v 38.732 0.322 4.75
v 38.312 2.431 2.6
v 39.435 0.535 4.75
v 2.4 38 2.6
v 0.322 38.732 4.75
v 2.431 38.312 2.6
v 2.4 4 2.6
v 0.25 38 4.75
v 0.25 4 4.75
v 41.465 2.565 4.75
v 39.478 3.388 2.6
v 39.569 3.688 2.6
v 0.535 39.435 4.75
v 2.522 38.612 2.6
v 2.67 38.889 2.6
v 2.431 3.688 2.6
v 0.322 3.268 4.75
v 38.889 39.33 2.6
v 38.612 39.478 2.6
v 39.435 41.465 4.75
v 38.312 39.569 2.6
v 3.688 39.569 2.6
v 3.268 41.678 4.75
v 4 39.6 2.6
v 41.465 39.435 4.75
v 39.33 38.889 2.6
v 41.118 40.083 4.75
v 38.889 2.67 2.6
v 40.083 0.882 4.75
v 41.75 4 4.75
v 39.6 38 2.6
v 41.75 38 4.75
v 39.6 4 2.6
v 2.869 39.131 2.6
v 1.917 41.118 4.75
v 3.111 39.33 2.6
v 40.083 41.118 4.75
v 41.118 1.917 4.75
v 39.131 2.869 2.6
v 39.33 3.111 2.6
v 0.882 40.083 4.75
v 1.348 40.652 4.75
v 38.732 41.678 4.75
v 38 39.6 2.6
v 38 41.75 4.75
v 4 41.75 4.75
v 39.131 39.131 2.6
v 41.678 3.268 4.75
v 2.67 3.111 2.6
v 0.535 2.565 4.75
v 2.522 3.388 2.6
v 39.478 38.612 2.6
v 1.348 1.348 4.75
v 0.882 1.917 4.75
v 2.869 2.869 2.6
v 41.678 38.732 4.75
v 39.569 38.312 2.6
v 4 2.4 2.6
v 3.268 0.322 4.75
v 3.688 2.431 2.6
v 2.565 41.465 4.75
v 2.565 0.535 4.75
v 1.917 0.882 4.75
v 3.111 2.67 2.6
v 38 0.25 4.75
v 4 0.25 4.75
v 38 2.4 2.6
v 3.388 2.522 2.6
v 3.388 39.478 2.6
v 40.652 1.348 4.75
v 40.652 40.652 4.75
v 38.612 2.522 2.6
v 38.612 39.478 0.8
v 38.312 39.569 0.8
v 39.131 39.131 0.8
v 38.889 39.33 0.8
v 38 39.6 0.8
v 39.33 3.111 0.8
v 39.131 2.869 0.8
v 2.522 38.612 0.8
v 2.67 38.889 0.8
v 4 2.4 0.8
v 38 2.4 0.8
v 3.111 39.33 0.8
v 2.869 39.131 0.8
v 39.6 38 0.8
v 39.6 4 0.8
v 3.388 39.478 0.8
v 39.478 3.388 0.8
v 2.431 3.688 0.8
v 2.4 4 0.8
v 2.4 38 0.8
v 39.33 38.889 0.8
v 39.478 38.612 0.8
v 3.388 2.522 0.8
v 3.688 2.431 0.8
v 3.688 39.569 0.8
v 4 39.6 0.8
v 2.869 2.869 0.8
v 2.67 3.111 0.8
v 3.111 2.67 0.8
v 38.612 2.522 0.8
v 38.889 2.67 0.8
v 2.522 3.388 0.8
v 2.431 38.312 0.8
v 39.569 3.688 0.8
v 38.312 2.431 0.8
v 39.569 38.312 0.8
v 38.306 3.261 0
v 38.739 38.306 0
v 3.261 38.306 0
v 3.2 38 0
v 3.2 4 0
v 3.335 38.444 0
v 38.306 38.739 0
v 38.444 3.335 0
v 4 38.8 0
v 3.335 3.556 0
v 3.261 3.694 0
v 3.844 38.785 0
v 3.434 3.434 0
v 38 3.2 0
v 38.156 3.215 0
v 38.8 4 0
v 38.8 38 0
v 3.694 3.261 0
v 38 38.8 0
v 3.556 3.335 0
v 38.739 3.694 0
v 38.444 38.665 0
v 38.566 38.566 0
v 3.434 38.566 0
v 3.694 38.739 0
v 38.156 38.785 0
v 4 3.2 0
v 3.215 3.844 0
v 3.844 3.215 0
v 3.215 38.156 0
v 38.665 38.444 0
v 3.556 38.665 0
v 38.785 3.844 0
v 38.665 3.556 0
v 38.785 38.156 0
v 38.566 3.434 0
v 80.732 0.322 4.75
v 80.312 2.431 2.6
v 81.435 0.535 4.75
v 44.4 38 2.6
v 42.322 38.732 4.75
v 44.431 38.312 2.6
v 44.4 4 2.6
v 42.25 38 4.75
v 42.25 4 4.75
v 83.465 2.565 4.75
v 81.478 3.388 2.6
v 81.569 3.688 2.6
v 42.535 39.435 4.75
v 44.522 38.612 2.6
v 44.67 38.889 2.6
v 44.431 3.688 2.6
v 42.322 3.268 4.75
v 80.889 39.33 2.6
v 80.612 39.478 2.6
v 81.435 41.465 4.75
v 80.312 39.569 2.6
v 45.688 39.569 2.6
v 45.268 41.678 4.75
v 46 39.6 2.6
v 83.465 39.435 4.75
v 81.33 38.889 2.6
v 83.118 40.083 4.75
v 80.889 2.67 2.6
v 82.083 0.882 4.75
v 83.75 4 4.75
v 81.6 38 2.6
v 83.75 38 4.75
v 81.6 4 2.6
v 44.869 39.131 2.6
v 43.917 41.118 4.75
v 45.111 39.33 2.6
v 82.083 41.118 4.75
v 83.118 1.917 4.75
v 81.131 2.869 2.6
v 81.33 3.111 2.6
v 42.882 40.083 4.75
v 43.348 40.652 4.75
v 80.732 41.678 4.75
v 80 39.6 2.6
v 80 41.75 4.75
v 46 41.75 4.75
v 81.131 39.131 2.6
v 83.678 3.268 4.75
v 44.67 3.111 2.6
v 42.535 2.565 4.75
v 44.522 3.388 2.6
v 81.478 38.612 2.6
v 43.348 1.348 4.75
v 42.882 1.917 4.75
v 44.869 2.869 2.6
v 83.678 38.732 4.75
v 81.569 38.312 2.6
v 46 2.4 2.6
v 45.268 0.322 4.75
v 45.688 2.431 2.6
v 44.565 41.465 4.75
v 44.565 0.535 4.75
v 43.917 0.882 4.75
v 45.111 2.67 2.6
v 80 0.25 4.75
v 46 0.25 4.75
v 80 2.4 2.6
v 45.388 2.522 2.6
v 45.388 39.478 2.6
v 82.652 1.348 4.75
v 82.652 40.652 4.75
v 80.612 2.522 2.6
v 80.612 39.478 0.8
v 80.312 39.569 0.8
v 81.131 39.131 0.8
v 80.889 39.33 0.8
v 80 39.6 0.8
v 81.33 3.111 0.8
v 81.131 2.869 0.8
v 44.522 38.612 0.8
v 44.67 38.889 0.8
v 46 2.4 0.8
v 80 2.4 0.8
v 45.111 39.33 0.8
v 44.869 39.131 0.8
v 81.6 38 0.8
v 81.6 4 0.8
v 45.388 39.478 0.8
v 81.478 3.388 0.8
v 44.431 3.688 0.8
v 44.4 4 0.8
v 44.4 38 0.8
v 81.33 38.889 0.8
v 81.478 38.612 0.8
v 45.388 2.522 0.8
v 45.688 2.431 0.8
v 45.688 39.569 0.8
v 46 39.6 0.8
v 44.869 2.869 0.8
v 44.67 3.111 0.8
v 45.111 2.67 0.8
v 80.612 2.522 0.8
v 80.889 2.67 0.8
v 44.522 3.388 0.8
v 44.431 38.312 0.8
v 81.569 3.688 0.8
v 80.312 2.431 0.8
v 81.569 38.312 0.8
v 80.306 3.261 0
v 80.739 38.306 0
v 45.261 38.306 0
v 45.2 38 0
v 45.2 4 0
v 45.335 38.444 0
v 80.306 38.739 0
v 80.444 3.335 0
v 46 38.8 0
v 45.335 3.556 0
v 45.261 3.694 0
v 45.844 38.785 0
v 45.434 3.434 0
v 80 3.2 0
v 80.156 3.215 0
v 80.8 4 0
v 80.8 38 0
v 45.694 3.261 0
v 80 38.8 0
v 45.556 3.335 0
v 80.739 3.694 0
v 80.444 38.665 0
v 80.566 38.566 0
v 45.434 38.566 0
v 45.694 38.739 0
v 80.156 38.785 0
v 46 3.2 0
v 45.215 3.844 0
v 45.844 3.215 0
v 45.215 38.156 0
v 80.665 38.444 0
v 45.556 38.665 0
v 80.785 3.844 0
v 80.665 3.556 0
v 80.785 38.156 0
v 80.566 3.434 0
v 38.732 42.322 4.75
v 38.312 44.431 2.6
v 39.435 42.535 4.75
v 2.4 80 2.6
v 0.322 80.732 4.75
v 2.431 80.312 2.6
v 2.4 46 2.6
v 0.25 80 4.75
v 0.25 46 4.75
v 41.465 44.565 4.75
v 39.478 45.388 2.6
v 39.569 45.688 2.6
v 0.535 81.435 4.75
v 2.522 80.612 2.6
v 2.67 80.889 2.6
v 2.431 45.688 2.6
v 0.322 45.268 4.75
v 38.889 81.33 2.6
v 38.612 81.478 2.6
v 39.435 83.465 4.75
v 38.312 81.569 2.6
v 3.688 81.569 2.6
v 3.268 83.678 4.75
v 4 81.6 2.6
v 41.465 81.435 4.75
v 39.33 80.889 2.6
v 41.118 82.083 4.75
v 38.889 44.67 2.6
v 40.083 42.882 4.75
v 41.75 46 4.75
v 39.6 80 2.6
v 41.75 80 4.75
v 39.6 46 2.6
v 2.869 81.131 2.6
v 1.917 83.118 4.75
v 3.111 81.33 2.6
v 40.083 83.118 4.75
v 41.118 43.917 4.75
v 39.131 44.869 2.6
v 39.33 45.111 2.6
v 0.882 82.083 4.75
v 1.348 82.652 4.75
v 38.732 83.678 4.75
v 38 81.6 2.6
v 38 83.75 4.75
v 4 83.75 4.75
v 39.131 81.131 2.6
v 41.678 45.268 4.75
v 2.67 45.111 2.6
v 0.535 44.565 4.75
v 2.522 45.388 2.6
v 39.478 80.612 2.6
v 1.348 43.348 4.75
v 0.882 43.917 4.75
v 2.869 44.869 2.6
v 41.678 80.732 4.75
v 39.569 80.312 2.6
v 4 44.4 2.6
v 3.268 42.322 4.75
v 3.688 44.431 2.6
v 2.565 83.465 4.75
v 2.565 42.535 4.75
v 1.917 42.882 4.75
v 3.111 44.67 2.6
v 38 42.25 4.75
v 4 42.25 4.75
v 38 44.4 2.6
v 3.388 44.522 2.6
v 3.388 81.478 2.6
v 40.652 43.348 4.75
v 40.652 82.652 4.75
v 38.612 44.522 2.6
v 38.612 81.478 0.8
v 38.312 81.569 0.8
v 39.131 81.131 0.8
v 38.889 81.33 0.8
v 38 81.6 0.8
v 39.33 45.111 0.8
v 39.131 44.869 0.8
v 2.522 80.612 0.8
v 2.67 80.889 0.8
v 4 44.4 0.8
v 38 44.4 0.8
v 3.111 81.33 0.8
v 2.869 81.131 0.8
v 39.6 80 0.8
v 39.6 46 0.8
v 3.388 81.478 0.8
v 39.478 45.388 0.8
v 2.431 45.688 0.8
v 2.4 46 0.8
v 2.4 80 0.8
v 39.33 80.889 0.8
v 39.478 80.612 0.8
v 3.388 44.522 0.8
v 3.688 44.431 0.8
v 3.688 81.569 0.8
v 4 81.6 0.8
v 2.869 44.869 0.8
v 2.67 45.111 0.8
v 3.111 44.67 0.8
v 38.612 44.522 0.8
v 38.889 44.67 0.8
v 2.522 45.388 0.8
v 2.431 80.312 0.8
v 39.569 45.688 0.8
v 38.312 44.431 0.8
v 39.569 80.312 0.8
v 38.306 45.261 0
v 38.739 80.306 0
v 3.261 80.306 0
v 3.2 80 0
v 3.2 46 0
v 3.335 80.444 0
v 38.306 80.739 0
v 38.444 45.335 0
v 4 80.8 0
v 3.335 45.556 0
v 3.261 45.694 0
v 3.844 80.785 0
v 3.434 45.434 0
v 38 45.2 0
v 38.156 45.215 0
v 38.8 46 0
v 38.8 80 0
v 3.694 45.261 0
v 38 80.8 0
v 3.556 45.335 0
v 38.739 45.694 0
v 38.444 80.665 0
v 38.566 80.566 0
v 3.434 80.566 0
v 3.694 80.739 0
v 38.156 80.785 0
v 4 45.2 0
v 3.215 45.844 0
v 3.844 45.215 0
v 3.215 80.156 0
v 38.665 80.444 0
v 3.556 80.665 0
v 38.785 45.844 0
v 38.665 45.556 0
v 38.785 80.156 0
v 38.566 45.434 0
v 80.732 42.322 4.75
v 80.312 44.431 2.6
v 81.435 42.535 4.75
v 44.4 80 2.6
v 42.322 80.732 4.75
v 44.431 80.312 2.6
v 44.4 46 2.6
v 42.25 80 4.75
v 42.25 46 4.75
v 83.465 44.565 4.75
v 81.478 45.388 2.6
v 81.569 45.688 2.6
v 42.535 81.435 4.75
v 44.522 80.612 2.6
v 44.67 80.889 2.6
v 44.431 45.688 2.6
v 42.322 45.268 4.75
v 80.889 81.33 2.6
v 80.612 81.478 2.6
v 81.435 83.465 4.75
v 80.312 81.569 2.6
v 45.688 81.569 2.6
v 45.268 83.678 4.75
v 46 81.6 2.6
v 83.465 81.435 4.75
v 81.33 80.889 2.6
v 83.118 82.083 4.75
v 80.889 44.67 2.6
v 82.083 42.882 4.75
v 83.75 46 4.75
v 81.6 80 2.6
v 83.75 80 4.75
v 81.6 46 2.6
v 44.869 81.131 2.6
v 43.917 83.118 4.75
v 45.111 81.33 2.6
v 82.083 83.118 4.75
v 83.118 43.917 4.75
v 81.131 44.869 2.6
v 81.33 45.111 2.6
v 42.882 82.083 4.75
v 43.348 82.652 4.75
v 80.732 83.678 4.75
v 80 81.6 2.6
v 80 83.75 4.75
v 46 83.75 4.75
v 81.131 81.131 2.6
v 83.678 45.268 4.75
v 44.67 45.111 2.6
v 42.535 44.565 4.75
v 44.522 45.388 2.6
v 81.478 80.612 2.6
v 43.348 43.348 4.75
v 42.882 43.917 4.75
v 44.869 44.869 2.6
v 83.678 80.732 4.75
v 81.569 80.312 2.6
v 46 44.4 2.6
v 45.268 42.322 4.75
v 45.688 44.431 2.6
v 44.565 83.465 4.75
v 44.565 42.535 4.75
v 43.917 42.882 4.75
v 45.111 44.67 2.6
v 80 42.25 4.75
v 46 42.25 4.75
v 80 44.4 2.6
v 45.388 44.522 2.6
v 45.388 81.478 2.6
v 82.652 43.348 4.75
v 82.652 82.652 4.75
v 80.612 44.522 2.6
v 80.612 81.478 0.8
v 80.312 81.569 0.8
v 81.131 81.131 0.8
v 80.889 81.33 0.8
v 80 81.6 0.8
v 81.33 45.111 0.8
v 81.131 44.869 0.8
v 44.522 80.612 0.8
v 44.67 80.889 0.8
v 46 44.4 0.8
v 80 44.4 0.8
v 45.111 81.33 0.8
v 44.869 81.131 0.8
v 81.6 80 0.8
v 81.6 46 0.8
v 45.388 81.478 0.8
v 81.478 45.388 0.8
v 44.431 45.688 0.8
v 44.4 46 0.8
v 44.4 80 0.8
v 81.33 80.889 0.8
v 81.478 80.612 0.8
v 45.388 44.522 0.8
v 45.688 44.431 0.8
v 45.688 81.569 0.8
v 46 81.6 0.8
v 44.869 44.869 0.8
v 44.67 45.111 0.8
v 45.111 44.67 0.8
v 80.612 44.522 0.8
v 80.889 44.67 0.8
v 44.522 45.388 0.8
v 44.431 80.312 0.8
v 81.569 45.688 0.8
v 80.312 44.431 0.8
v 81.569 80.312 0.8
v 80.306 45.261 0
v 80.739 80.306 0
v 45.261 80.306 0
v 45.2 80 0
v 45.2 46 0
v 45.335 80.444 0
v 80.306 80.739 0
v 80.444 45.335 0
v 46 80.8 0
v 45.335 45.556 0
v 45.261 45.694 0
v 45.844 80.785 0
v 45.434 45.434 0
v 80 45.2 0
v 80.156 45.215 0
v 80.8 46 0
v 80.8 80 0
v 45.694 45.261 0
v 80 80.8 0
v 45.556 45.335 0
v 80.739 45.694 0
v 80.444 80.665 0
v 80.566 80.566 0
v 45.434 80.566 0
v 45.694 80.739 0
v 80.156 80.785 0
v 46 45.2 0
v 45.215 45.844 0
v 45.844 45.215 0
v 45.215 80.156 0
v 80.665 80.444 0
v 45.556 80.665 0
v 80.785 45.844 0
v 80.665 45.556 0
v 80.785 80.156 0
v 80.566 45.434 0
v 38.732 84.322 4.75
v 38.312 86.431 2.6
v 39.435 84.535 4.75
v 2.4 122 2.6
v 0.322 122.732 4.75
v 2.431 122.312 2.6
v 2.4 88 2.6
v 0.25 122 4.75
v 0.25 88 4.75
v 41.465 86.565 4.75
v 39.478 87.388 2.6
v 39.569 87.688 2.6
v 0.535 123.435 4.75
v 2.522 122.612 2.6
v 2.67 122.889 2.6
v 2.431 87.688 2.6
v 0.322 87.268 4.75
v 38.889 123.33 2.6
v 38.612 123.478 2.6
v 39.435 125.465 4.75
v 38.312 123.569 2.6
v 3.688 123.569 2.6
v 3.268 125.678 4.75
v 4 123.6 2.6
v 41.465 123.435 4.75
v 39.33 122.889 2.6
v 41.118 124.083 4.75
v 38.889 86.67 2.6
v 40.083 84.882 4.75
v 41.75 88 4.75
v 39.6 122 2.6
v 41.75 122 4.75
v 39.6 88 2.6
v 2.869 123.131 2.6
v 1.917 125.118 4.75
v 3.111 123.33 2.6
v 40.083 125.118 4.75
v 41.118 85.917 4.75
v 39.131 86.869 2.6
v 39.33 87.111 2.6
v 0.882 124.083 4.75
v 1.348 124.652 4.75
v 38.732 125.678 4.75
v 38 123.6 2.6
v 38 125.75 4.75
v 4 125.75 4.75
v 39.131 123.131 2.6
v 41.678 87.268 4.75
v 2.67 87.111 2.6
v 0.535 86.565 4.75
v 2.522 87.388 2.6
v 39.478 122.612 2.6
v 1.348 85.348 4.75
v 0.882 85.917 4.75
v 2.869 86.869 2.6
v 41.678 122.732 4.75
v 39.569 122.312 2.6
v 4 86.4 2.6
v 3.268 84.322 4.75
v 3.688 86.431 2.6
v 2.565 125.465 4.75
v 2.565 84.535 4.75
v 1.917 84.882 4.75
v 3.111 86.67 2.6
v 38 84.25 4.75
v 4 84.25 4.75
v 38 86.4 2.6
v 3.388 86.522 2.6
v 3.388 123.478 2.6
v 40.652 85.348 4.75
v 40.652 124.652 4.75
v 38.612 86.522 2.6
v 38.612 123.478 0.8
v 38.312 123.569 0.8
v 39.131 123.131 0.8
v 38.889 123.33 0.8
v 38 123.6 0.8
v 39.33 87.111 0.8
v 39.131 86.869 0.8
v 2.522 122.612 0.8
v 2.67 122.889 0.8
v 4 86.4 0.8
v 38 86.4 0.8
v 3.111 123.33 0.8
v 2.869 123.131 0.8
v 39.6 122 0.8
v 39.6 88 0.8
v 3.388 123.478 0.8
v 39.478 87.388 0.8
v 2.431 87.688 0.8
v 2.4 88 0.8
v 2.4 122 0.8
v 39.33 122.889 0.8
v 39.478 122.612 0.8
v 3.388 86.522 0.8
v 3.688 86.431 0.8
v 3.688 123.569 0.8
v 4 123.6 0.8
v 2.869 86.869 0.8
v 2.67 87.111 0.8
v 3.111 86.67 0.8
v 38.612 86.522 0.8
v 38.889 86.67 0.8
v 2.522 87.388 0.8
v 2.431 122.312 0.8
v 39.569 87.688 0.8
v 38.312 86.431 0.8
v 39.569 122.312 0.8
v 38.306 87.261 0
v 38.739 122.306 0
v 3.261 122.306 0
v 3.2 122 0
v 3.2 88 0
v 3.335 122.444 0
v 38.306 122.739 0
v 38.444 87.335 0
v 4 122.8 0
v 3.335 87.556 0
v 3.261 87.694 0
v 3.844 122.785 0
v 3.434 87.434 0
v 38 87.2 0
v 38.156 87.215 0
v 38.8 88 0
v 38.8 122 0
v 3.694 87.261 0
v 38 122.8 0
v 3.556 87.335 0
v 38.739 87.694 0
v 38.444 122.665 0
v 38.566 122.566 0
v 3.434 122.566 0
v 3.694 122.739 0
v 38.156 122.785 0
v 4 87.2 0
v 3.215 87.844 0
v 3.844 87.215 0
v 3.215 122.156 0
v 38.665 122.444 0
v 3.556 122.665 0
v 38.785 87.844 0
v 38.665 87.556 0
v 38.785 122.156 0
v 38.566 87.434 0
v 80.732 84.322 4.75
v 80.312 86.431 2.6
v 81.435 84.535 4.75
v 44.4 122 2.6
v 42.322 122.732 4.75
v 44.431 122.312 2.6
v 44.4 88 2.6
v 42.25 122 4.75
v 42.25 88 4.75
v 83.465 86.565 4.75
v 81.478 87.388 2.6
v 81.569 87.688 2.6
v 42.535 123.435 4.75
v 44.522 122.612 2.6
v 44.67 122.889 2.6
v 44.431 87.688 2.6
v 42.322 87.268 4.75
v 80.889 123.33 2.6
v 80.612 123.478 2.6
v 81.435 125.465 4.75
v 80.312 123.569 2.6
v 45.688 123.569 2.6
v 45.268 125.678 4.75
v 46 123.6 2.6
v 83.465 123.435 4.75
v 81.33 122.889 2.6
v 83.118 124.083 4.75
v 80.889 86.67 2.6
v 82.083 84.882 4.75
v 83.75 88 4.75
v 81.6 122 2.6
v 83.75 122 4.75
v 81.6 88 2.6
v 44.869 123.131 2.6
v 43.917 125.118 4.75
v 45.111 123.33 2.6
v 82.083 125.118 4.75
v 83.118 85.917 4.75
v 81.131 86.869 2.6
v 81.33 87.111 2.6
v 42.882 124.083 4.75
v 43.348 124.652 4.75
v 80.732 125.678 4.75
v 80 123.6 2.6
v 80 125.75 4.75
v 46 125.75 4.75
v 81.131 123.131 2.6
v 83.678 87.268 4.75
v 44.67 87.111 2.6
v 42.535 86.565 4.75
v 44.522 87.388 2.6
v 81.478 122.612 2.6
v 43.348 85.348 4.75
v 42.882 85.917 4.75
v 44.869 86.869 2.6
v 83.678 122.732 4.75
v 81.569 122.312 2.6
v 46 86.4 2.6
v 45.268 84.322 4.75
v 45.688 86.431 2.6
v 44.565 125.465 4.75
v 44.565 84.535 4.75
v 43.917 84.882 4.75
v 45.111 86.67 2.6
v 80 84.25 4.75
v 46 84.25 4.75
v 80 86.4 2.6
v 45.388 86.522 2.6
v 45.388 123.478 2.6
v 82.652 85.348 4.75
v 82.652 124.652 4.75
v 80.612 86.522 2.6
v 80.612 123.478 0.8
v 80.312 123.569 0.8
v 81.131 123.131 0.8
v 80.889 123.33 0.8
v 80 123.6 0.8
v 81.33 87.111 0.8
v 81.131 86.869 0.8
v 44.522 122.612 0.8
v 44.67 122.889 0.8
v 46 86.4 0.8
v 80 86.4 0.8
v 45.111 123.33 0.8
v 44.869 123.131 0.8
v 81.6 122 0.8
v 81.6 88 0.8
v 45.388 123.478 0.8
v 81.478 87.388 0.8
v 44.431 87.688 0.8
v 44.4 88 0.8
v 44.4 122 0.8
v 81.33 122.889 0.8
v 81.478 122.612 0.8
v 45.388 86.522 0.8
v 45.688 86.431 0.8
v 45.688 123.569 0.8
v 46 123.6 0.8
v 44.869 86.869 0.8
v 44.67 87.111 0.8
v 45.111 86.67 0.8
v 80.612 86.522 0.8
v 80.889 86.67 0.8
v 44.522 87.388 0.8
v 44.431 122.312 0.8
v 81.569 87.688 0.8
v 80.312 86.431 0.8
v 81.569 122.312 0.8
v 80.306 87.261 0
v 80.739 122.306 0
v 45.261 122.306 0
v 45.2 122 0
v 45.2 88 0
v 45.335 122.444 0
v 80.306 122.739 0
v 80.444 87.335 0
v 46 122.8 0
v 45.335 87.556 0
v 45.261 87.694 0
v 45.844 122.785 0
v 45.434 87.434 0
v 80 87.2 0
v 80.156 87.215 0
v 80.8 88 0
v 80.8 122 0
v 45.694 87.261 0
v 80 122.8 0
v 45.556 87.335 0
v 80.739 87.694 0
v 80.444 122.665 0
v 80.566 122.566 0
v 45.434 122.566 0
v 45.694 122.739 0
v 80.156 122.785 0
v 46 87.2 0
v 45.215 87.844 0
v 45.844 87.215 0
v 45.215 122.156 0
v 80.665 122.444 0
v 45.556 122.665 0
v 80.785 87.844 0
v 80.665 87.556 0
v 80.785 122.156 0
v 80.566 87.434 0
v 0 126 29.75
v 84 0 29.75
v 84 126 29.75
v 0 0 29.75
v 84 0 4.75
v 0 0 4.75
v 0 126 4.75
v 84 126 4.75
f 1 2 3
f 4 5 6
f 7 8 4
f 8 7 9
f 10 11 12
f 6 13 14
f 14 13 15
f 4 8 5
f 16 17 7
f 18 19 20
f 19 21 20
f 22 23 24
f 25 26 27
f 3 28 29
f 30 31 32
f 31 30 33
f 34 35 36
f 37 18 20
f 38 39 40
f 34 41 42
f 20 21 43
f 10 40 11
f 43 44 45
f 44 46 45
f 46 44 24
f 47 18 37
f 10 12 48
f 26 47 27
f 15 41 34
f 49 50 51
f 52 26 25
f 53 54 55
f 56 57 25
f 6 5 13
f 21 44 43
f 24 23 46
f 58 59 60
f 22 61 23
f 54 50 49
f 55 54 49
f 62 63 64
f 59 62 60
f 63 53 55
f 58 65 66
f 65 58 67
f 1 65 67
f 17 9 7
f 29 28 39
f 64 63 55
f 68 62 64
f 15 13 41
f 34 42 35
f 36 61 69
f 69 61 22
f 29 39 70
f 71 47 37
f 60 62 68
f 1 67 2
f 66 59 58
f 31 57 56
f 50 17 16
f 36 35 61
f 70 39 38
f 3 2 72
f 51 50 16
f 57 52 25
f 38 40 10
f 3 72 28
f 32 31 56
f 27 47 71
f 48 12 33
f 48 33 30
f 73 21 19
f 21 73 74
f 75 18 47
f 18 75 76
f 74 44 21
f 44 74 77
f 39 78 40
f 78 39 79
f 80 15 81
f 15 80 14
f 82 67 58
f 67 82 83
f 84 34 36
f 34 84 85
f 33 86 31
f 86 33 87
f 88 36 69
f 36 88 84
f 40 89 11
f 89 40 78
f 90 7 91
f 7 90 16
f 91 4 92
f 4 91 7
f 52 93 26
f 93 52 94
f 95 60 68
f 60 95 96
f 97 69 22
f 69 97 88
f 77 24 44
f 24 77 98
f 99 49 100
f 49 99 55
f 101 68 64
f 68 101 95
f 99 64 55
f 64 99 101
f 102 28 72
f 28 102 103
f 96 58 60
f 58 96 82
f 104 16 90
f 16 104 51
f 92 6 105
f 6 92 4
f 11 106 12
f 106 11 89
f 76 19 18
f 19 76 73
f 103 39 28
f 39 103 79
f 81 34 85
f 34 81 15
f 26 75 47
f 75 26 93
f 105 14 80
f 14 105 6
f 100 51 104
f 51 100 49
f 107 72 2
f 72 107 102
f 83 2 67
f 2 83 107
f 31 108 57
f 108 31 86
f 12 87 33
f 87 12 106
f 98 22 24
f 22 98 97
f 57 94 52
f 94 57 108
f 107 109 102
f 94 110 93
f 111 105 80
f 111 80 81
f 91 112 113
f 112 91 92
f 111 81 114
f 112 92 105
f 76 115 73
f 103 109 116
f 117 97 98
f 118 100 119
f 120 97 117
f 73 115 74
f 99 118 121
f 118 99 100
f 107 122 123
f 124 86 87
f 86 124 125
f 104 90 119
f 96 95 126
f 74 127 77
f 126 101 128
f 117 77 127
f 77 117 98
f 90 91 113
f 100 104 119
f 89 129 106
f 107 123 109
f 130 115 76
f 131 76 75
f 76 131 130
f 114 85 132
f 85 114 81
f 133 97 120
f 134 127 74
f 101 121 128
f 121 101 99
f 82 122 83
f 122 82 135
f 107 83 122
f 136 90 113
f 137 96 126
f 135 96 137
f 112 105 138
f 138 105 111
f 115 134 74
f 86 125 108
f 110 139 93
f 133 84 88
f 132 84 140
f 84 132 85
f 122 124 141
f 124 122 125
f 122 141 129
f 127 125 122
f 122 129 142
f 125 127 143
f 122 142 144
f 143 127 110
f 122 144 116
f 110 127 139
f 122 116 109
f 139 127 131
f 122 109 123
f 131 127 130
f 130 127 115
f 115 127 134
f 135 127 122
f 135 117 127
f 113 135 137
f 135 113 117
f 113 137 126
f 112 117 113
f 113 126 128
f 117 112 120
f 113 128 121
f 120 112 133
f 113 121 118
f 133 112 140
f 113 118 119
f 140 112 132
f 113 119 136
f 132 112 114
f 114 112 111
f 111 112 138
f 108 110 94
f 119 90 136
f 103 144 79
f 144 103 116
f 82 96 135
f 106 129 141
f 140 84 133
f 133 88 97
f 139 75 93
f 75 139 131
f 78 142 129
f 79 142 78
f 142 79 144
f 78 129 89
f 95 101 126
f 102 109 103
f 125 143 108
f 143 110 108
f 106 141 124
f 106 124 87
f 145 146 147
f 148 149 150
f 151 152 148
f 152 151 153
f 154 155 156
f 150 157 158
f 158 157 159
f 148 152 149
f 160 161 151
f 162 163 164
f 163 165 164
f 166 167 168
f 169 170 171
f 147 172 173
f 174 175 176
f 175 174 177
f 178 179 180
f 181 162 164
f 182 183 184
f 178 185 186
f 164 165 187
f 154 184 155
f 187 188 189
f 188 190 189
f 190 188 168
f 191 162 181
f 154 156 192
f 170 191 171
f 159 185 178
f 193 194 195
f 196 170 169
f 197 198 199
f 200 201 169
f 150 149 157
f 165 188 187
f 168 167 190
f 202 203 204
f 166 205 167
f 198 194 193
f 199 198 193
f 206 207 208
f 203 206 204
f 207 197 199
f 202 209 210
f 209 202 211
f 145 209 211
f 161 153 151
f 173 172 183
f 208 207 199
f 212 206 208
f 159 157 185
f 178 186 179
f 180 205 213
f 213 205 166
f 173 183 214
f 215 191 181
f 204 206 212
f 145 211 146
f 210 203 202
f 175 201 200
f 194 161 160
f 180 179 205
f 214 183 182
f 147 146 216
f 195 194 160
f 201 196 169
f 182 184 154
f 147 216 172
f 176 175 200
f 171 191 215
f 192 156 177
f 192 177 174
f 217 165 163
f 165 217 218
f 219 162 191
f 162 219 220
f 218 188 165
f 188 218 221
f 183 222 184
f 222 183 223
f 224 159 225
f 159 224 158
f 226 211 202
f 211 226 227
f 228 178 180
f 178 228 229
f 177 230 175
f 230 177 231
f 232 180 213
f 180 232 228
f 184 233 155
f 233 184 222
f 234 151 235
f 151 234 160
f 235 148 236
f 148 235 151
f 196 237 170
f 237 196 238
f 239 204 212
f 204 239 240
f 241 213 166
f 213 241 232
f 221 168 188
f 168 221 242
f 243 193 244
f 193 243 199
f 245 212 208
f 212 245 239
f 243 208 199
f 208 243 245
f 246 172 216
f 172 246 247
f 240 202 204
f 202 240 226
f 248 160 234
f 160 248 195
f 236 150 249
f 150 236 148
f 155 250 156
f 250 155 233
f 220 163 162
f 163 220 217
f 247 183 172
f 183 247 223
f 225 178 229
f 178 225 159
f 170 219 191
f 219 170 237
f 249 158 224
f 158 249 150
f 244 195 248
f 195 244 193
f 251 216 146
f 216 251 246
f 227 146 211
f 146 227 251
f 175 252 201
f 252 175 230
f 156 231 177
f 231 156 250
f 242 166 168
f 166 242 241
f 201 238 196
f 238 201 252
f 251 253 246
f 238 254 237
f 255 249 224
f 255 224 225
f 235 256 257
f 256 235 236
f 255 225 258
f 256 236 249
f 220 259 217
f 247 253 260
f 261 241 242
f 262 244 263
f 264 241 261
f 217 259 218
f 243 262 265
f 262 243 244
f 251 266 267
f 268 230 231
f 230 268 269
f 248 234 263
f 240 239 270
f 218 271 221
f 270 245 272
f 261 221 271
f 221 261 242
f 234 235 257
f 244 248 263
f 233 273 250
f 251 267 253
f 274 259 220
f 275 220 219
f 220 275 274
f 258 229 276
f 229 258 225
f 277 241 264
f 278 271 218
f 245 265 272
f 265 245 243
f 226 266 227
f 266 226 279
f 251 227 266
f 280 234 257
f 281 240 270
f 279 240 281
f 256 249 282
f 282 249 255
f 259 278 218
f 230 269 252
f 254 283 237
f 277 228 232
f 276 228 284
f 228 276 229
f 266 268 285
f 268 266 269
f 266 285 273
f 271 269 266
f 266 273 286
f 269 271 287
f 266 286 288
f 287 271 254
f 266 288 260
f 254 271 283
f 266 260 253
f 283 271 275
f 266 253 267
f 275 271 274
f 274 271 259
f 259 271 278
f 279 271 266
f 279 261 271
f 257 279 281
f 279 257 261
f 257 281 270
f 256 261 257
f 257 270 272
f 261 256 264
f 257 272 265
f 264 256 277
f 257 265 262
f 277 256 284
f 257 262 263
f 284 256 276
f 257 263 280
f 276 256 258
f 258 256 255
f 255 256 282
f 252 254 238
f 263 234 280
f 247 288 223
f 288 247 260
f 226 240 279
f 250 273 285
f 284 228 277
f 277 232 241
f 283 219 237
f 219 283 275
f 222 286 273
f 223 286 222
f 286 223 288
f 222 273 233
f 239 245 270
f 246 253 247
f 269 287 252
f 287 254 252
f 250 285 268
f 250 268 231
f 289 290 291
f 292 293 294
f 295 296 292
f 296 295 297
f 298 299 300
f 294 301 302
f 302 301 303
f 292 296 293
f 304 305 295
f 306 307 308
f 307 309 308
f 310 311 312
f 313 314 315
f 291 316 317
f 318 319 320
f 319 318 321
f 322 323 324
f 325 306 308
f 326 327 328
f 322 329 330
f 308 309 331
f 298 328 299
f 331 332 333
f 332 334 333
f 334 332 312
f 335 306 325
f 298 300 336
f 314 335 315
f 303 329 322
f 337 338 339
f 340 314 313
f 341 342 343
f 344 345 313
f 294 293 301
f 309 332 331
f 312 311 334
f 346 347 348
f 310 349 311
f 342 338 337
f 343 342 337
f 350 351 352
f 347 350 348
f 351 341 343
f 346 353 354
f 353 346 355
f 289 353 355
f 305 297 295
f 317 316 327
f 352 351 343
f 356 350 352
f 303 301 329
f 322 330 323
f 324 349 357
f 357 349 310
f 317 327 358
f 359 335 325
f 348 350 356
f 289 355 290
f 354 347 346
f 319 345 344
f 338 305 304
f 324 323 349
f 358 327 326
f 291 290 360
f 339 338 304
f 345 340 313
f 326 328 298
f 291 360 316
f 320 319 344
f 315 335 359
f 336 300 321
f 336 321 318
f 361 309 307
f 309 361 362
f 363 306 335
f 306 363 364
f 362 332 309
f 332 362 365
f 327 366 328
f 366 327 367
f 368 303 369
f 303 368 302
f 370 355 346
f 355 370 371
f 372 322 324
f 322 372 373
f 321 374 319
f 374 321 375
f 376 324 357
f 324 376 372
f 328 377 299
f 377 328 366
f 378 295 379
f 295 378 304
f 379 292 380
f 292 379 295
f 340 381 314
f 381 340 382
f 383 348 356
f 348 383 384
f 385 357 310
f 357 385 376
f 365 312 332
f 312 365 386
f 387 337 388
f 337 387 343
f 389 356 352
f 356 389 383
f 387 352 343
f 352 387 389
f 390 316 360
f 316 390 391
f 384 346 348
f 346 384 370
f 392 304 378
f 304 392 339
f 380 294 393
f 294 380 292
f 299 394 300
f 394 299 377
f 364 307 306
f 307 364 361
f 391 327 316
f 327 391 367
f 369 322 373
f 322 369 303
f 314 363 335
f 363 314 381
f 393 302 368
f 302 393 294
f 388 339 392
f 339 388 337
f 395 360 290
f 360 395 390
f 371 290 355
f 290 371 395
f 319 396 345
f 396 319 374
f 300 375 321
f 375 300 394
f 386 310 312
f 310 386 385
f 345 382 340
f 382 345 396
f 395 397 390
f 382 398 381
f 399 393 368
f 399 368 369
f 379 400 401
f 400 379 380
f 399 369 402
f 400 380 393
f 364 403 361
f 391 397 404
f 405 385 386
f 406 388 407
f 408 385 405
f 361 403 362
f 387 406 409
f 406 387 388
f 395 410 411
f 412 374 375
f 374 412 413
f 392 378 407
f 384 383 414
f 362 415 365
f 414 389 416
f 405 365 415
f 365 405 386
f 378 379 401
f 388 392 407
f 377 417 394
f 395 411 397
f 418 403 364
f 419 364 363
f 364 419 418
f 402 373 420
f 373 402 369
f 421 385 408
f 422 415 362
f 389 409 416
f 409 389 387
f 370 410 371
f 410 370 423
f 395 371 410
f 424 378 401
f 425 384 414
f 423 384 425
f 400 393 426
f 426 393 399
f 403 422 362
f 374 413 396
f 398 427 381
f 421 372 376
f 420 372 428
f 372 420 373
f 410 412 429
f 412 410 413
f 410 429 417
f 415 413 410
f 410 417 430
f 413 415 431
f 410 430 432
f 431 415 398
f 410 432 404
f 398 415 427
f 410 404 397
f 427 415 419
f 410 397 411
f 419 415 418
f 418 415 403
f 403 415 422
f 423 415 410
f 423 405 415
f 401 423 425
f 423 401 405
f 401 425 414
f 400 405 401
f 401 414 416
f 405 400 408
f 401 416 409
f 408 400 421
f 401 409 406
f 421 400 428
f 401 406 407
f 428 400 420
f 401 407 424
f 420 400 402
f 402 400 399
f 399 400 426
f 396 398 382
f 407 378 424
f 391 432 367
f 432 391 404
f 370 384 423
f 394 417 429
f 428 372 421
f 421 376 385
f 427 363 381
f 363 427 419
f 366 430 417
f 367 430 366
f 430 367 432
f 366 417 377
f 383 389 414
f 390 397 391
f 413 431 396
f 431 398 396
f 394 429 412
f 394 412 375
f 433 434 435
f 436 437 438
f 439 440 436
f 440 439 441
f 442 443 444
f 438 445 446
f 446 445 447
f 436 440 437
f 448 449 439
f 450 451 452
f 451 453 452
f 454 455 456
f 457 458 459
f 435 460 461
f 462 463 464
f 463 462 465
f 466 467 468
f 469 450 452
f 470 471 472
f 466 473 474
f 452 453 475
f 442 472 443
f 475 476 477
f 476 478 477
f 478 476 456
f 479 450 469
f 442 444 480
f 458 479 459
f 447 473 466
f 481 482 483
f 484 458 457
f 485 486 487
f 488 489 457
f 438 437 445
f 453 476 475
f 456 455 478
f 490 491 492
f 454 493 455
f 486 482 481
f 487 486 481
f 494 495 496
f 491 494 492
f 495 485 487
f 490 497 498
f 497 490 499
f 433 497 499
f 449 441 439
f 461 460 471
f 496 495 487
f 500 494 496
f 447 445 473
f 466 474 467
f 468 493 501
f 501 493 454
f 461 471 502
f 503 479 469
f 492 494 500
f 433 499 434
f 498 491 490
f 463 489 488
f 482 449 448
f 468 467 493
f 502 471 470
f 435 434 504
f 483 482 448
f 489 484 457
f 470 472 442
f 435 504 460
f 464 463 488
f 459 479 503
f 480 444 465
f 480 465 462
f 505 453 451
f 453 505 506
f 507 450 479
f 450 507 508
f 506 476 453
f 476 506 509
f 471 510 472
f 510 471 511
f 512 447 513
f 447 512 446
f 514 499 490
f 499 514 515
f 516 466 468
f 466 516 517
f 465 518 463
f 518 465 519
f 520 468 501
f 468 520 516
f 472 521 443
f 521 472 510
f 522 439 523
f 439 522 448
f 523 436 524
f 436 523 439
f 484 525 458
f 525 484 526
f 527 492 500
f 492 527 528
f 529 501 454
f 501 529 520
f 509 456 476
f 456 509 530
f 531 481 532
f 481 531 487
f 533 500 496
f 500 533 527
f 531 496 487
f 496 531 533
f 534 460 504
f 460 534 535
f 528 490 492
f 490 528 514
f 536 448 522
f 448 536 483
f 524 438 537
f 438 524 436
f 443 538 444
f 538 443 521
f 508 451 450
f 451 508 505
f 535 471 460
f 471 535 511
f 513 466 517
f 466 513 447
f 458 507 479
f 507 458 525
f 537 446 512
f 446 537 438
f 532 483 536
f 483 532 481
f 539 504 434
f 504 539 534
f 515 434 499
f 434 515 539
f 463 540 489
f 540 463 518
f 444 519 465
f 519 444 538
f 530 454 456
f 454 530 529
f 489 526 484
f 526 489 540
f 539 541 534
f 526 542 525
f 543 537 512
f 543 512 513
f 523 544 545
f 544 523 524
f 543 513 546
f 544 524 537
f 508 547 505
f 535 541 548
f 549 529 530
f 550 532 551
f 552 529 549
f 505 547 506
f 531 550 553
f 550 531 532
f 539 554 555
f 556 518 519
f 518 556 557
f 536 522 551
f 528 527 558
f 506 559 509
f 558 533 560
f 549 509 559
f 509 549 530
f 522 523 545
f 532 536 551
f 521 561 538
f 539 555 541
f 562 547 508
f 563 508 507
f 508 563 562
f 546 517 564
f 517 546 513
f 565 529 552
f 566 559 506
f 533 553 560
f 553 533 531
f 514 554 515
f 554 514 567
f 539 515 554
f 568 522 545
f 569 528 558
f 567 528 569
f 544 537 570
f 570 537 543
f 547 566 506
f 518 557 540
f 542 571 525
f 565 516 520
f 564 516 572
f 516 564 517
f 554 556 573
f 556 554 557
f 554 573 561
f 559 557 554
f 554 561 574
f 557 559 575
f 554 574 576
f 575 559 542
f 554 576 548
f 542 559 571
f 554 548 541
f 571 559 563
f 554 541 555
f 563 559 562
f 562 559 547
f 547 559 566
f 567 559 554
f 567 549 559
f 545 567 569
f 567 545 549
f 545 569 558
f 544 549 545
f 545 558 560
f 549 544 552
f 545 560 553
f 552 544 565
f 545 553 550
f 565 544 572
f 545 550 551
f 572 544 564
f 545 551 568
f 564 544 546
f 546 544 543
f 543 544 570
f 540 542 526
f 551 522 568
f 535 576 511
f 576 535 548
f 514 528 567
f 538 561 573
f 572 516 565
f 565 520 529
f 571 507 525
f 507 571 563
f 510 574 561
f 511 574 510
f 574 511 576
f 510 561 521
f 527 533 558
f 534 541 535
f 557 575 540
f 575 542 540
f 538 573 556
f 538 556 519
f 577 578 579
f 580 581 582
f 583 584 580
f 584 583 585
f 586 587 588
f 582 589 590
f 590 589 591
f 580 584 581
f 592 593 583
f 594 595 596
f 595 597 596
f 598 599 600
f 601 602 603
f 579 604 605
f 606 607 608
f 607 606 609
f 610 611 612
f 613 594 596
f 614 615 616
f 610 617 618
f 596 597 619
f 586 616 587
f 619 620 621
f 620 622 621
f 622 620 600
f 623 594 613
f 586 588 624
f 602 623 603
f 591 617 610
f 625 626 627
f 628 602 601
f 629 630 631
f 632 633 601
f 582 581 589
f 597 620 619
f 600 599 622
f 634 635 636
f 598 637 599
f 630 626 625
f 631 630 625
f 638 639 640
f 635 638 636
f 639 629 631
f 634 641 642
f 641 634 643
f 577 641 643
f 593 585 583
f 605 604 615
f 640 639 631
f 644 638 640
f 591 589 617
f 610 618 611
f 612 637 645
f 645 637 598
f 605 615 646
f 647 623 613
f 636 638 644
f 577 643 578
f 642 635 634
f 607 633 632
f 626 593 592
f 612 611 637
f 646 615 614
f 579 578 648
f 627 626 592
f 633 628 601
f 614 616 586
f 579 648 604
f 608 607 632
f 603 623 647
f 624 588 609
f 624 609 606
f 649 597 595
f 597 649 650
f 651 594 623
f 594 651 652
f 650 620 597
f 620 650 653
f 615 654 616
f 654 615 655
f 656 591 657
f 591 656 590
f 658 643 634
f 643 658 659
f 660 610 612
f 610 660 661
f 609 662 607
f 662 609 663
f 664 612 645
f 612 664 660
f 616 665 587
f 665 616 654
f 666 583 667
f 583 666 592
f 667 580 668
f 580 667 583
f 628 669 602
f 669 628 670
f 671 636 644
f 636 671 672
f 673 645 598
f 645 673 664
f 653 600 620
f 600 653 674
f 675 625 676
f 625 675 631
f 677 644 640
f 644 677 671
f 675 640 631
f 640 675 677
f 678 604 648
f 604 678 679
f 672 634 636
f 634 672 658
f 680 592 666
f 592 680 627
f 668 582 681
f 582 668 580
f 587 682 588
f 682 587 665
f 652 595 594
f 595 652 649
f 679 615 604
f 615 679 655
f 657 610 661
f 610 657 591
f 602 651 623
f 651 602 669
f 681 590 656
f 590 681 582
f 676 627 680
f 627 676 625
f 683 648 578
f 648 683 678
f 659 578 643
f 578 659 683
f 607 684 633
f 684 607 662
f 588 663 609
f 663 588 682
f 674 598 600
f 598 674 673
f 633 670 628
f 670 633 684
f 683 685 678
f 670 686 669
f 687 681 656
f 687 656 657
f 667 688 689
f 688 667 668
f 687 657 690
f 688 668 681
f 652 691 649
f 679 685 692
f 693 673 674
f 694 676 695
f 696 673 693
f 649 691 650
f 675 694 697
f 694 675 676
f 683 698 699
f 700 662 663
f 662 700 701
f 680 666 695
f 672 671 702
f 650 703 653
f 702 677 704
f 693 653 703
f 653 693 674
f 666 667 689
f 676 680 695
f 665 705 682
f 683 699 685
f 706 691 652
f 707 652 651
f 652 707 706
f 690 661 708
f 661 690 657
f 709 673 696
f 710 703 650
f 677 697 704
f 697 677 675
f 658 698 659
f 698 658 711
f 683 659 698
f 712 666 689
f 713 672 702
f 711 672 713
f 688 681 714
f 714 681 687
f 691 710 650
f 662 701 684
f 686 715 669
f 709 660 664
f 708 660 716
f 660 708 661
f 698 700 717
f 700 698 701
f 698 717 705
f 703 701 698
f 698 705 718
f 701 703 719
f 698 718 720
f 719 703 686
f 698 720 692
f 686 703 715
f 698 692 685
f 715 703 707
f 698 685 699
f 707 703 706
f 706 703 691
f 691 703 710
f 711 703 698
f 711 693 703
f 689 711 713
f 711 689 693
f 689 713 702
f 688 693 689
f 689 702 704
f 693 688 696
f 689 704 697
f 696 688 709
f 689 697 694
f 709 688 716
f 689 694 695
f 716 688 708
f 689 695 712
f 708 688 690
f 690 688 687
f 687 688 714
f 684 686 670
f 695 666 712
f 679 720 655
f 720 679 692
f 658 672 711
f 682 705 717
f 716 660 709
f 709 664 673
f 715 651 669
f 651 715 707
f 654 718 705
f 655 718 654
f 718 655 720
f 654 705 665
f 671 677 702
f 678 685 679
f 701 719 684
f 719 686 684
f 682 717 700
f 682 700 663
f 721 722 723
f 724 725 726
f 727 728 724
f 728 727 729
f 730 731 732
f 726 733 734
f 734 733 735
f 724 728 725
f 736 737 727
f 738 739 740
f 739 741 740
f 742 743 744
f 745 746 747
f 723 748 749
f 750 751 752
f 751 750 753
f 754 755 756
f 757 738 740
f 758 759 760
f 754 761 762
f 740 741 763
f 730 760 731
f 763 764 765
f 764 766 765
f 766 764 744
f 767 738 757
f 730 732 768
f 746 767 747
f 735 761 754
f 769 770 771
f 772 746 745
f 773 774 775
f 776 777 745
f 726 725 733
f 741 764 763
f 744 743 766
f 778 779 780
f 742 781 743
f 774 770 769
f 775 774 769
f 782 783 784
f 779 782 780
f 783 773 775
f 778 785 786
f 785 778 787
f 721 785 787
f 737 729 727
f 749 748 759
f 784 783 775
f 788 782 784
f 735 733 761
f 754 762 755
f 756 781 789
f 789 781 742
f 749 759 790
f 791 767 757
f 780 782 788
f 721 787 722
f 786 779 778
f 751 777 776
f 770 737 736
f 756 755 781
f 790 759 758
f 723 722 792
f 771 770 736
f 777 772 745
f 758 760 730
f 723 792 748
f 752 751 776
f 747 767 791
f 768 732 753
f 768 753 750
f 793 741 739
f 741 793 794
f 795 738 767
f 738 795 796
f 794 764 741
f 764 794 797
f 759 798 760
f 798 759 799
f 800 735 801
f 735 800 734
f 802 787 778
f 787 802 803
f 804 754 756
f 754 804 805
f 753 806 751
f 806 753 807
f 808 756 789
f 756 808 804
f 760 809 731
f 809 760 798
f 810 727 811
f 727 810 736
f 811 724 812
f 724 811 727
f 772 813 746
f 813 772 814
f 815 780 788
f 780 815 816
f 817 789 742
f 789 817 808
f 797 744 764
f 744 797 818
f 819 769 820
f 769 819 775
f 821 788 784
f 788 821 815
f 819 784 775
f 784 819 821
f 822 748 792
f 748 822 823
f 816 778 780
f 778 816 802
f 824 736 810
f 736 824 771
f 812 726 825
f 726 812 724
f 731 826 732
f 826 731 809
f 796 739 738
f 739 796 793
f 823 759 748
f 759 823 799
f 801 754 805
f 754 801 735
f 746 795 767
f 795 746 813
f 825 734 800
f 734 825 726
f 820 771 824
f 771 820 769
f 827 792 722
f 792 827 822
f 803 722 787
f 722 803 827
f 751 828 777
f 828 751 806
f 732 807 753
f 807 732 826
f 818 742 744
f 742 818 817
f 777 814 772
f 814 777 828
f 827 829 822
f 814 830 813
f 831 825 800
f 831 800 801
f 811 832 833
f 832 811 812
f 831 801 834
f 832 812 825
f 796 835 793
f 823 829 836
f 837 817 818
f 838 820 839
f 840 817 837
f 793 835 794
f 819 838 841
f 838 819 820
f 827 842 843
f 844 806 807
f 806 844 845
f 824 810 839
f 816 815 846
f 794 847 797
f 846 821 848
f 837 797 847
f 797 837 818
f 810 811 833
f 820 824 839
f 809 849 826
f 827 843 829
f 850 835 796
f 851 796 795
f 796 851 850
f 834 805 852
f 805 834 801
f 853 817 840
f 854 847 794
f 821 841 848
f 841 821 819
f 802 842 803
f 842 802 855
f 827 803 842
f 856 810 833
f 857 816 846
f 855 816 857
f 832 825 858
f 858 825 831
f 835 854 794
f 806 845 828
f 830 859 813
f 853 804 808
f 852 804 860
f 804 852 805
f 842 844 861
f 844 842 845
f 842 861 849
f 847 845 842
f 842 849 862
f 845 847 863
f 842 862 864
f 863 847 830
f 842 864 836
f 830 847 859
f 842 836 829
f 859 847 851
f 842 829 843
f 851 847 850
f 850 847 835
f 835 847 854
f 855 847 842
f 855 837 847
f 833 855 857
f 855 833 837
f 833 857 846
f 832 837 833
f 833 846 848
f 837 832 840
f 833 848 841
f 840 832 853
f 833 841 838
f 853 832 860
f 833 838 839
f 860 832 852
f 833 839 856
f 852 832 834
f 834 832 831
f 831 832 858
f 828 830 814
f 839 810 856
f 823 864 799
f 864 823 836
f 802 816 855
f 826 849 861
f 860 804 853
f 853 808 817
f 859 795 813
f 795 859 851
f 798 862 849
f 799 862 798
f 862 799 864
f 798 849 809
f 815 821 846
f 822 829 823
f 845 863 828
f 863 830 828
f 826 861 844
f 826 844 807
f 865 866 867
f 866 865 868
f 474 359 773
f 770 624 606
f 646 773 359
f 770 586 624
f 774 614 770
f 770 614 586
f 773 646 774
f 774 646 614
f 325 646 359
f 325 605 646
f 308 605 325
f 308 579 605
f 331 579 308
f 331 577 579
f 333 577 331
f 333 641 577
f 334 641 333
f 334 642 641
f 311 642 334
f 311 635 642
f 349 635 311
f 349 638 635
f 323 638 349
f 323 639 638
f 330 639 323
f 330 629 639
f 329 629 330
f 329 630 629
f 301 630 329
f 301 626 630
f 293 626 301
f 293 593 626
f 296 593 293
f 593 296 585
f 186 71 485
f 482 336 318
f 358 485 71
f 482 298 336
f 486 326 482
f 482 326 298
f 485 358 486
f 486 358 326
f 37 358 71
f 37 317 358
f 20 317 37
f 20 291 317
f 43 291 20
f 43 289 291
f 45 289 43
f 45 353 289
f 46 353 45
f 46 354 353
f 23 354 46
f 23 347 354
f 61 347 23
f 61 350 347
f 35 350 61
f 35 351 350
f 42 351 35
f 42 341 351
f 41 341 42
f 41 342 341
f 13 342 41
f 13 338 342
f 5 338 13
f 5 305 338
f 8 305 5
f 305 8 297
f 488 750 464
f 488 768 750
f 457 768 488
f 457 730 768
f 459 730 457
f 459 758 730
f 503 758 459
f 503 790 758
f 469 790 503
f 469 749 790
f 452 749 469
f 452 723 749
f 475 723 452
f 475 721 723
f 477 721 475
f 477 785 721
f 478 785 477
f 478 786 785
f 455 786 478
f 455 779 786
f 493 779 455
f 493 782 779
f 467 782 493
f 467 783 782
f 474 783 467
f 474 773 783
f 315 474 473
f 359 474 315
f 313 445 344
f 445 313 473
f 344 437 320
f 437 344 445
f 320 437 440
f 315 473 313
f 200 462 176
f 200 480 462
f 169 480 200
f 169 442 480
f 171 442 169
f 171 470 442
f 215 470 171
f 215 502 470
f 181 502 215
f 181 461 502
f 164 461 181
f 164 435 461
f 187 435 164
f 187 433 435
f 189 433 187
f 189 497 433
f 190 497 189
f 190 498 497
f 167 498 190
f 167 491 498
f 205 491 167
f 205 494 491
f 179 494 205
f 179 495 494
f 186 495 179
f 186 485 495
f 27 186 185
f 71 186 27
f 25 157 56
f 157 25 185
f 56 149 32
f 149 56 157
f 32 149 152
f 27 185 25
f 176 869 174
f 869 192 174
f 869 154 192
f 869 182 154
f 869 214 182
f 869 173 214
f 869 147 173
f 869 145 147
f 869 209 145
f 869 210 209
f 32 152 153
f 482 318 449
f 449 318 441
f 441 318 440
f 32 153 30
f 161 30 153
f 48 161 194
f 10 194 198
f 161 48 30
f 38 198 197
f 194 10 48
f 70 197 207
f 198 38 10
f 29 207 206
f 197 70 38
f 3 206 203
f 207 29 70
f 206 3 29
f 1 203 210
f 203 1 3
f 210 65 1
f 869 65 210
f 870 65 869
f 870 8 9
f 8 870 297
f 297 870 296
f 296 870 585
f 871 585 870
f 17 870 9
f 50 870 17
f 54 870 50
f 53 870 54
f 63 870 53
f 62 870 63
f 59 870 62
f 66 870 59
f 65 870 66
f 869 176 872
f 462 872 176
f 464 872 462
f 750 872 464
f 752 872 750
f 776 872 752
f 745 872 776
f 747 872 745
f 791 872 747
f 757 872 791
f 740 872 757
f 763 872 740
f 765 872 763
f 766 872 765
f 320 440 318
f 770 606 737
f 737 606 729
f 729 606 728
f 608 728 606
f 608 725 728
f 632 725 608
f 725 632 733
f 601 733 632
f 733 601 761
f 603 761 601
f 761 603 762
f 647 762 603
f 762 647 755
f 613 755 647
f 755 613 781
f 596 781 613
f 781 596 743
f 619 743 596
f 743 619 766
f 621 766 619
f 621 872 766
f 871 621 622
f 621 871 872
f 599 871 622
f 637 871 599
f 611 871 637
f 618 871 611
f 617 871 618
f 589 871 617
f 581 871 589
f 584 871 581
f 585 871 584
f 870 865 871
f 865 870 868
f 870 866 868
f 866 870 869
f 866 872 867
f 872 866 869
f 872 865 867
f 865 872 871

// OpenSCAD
// file: ../../gfbadjust/templates/gridfinity_base.scad
// Minimal, from-scratch Gridfinity base foot module.
//
// Dimensions reverse-engineered directly from real reference bins
// (gf-rebuilt "Standard" bins) since they're the ground truth: the
// chamfer profile (0.8mm chamfer, 1.8mm plateau, 2.15mm chamfer;
// 3.75mm corner radius; 4.75mm total height) is the SAME absolute
// geometry regardless of foot size -- a 21mm foot uses an identical
// profile to a 42mm foot, just applied around a smaller top island
// (cell_size - BASE_GAP_MM instead of 42 - BASE_GAP_MM). No magnet/
// screw holes, no lid/label geometry -- just the foot.

BASE_GAP_MM = 0.5;

// (inset, height) pairs, with height measured DOWNWARD from the top of
// the profile (where it meets the body, inset=0) to the bottom tip
// (inset=2.95, the narrowest point that noses into the baseplate).
BASE_PROFILE = [[0, 0], [2.15, 2.15], [2.15, 3.95], [2.95, 4.75]];

BASE_PROFILE_HEIGHT = 4.75;
BASE_HEIGHT = 4.75;

BASE_TOP_RADIUS = 3.75;

// A rounded square eroded by `inset` from a top_size/BASE_TOP_RADIUS
// square. Uniform offsetting a rounded rect inward by `d` shrinks its
// side by 2d and its corner radius by d -- this is what makes stacking
// these slabs and hull()-ing between consecutive ones reproduce the
// profile's chamfers exactly (the profile is a piecewise-linear,
// self-similar offset curve).
module _eroded_square(top_size, inset) {
    w = top_size - 2 * inset;
    r = max(0, BASE_TOP_RADIUS - inset);
    if (r < 0.001) {
        square([w, w], center = true);
    } else {
        offset(r = r) square([w - 2 * r, w - 2 * r], center = true);
    }
}

module _foot_slab(top_size, inset, height, thickness = 0.001) {
    // Flip the profile's top-down height into local Z measured from the
    // true bottom tip (local Z=0) upward, so the wide (inset=0) end
    // lands at BASE_PROFILE_HEIGHT, flush against the body above it.
    z = BASE_PROFILE_HEIGHT - height;
    translate([0, 0, z])
        linear_extrude(height = thickness)
            _eroded_square(top_size, inset);
}

// A single, fully independent Gridfinity-style foot sized to `cell_size`
// (e.g. 42 for a standard foot, 21 for a quarter-size one) -- same
// absolute BASE_PROFILE/BASE_TOP_RADIUS either way, just applied to a
// top island of (cell_size - BASE_GAP_MM) instead of always 41.5.
// Centered at local (0,0) in XY; spans local Z=0 (bottom tip) to
// Z=BASE_HEIGHT (top, meant to sit flush against the body's bottom
// face).
module sub_foot(cell_size) {
    top_size = cell_size - BASE_GAP_MM;
    for (i = [0 : len(BASE_PROFILE) - 2]) {
        p0 = BASE_PROFILE[i];
        p1 = BASE_PROFILE[i + 1];
        hull() {
            _foot_slab(top_size, p0[0], p0[1]);
            _foot_slab(top_size, p1[0], p1[1]);
        }
    }
}
// main file
// Builds synthetic test bins using the same sub_foot() module the tool
// itself uses, so the fixtures' original feet are a known-correct
// reference (standard 42mm feet, since the input is assumed to always
// be whole-cell). Select which fixture to render with:
//   openscad -D 'fixture="rect"'      -o simple_bin.stl make_fixtures.scad
//   openscad -D 'fixture="lshape"'    -o lshape_bin.stl make_fixtures.scad
//   openscad -D 'fixture="offset"'    -o offset_bin.stl make_fixtures.scad
//   openscad -D 'fixture="islands"'   -o islands_bin.stl make_fixtures.scad
//   openscad -D 'fixture="centerholes"' -o centerholes_bin.stl make_fixtures.scad

include <../../gfbadjust/templates/gridfinity_base.scad>

$fn = 32;

WALL_HEIGHT = 25;

RECT_CELLS = [[0, 0], [1, 0], [0, 1], [1, 1], [0, 2], [1, 2]]; // 2x3
LSHAPE_CELLS = [[0, 0], [1, 0], [0, 1]]; // 2x2 missing [1,1]

// Same layout as "rect", but positioned far from world (0,0) -- e.g. a
// part laid out far from the origin on a build plate. Regression test
// for a bug where the cut's clipping box was a fixed box around world
// origin and silently clipped nothing for models positioned outside it.
OFFSET_ORIGIN = [1400, 200];

fixture = "rect";

module fixture_bin(cells, origin = [0, 0]) {
    union() {
        for (c = cells)
            translate([origin[0] + c[0] * 42 + 21, origin[1] + c[1] * 42 + 21, 0])
                sub_foot(42);
        for (c = cells)
            translate([origin[0] + c[0] * 42, origin[1] + c[1] * 42, BASE_HEIGHT])
                cube([42, 42, WALL_HEIGHT]);
    }
}

// Same layout as "rect", but each cell is its OWN separate physical
// block (foot + wall), not fused into one continuous body -- walls are
// inset slightly so neighboring cells never touch. Regression test for
// a bug where footprint detection assumed a single "main" outer loop
// and silently truncated a multi-island footprint down to one cell.
ISLAND_WALL_INSET = 0.1;

module fixture_bin_islands(cells, origin = [0, 0]) {
    wall_size = 42 - 2 * ISLAND_WALL_INSET;
    union() {
        for (c = cells)
            translate([origin[0] + c[0] * 42 + 21, origin[1] + c[1] * 42 + 21, 0])
                sub_foot(42);
        for (c = cells)
            translate([
                origin[0] + c[0] * 42 + ISLAND_WALL_INSET,
                origin[1] + c[1] * 42 + ISLAND_WALL_INSET,
                BASE_HEIGHT
            ])
                cube([wall_size, wall_size, WALL_HEIGHT]);
    }
}

// Same layout as "rect", but with a small hole bored straight through
// the center of every 21mm placement sub-cell. This is a minimal,
// generic stand-in for "some small local void lands exactly on the
// occupancy sample point" -- a drilled hole is the easiest way to
// construct that in OpenSCAD, though the real file that found this bug
// (a "Narrow Trays with Labels" bin) had no holes at all: its base is a
// plain solid single cell, but its body has a scalloped, egg-crate
// floor whose rounded trough bottoms happened to dip to their lowest
// point almost exactly at a placement cell's centroid. Either way, the
// occupancy test's single centroid sample landed exactly inside a
// local void -- the even-odd rule then saw the sample as "inside two
// loops" (solid footprint + hole), canceling out to "not occupied", so
// a fully solid bin was silently detected as having zero occupied
// cells.
CENTER_HOLE_RADIUS = 1.5;

module fixture_bin_centerholes(cells, origin = [0, 0]) {
    difference() {
        fixture_bin(cells, origin);
        for (c = cells)
            for (sub = [[10.5, 10.5], [31.5, 10.5], [10.5, 31.5], [31.5, 31.5]])
                translate([
                    origin[0] + c[0] * 42 + sub[0],
                    origin[1] + c[1] * 42 + sub[1],
                    -1
                ])
                    cylinder(r = CENTER_HOLE_RADIUS, h = BASE_HEIGHT + WALL_HEIGHT + 2);
    }
}

if (fixture == "lshape") {
    fixture_bin(LSHAPE_CELLS);
} else if (fixture == "offset") {
    fixture_bin(RECT_CELLS, OFFSET_ORIGIN);
} else if (fixture == "islands") {
    fixture_bin_islands(RECT_CELLS);
} else if (fixture == "centerholes") {
    fixture_bin_centerholes(RECT_CELLS);
} else {
    fixture_bin(RECT_CELLS);
}
